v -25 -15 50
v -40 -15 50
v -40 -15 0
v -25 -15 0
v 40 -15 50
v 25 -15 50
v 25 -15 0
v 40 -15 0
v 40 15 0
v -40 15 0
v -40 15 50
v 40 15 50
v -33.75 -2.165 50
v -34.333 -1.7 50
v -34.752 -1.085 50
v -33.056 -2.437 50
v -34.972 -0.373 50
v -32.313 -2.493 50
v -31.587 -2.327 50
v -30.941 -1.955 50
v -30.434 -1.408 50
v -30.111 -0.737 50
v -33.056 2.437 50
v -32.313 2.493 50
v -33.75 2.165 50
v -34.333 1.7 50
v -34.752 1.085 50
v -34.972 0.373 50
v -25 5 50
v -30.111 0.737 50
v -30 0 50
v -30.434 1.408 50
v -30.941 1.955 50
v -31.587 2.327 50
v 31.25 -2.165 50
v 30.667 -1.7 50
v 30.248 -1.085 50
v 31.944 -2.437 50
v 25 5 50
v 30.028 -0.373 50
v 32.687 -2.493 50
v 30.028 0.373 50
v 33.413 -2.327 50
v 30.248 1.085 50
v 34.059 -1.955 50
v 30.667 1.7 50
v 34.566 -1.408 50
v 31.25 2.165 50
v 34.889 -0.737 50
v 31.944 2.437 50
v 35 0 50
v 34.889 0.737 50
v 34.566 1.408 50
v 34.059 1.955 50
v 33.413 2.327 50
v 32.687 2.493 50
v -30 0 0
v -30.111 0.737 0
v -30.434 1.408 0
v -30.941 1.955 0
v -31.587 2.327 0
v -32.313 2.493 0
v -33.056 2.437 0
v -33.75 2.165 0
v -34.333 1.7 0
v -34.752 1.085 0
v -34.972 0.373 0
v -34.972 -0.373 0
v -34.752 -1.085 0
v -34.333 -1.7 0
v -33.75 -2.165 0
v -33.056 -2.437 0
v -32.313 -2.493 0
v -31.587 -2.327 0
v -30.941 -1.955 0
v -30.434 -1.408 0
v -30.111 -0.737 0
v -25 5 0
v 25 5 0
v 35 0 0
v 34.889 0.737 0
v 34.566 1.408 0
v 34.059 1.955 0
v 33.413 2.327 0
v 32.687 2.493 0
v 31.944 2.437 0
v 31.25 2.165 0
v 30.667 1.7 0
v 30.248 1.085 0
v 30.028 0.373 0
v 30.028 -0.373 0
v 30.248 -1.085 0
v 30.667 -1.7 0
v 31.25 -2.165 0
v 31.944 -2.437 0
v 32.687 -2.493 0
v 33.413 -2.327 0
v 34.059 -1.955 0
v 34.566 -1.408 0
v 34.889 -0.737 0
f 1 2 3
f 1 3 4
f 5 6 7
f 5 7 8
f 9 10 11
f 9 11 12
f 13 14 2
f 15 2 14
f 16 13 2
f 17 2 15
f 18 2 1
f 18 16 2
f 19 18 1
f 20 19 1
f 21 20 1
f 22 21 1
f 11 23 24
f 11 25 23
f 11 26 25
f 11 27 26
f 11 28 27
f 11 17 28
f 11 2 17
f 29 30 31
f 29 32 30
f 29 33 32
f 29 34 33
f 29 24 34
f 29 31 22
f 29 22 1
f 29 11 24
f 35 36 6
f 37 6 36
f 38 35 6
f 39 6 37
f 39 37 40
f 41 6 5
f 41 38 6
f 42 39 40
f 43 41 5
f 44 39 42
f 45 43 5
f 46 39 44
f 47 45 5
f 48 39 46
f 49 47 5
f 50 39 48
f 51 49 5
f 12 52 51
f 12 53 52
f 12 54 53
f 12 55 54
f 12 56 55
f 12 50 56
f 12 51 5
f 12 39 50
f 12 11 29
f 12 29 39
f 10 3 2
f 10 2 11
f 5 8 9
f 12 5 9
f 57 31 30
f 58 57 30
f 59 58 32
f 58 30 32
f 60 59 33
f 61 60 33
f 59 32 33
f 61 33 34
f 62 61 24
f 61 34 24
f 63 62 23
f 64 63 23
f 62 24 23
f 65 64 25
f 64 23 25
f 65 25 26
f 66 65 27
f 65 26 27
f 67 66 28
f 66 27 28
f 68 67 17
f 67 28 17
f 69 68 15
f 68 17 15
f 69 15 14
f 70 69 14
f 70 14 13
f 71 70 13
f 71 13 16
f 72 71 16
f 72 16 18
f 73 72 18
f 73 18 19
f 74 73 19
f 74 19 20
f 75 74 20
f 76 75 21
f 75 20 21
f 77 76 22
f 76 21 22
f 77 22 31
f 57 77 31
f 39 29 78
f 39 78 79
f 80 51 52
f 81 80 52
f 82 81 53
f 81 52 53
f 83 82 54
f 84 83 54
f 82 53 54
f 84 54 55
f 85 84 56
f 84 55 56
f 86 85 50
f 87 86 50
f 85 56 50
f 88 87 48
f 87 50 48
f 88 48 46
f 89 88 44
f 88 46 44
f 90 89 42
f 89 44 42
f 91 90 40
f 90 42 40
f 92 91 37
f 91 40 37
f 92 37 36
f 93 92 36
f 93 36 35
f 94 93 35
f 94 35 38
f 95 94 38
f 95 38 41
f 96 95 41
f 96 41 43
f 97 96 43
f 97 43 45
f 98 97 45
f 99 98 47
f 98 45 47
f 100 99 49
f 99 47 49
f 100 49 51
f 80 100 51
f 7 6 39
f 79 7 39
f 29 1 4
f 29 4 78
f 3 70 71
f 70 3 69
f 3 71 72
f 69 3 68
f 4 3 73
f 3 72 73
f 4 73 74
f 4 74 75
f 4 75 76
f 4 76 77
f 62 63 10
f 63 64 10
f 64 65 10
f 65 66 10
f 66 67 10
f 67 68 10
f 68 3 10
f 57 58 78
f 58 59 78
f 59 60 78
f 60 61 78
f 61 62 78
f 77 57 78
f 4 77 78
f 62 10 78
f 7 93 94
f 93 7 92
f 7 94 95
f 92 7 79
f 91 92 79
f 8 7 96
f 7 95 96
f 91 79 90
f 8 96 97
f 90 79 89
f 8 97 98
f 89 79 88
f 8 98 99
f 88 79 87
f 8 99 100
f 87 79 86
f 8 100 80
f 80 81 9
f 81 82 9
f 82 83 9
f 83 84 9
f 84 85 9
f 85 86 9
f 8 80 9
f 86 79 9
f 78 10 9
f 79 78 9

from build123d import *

# Parameters (mm, degrees)
SKETCH1_W           = 80
SKETCH1_H           = 30
BOSS_EXTRUDE1_DEPTH = 50
SKETCH2_W           = 50
SKETCH2_H           = 20
CUT_EXTRUDE1_DEPTH  = 50
SKETCH3_R           = 2.5
CUT_EXTRUDE2_DEPTH  = 50


with BuildPart() as part:
    # Sketch1 → Boss-Extrude1 (new body)
    with BuildSketch(Plane.XY):
        Rectangle(SKETCH1_W, SKETCH1_H)
    extrude(amount=BOSS_EXTRUDE1_DEPTH)

    # Sketch2 → Cut-Extrude1 (cut)
    with BuildSketch(Plane.XY.offset(50)):
        with Locations((0, -5)):
            Rectangle(SKETCH2_W, SKETCH2_H)
    extrude(amount=-CUT_EXTRUDE1_DEPTH, mode=Mode.SUBTRACT)

    # Sketch3 → Cut-Extrude2 (cut)
    with BuildSketch(Plane.XY.offset(50)):
        with Locations((-32.5, 0)):
            Circle(SKETCH3_R)
        with Locations((32.5, 0)):
            Circle(SKETCH3_R)
    extrude(amount=-CUT_EXTRUDE2_DEPTH, mode=Mode.SUBTRACT)


solid = part.part
